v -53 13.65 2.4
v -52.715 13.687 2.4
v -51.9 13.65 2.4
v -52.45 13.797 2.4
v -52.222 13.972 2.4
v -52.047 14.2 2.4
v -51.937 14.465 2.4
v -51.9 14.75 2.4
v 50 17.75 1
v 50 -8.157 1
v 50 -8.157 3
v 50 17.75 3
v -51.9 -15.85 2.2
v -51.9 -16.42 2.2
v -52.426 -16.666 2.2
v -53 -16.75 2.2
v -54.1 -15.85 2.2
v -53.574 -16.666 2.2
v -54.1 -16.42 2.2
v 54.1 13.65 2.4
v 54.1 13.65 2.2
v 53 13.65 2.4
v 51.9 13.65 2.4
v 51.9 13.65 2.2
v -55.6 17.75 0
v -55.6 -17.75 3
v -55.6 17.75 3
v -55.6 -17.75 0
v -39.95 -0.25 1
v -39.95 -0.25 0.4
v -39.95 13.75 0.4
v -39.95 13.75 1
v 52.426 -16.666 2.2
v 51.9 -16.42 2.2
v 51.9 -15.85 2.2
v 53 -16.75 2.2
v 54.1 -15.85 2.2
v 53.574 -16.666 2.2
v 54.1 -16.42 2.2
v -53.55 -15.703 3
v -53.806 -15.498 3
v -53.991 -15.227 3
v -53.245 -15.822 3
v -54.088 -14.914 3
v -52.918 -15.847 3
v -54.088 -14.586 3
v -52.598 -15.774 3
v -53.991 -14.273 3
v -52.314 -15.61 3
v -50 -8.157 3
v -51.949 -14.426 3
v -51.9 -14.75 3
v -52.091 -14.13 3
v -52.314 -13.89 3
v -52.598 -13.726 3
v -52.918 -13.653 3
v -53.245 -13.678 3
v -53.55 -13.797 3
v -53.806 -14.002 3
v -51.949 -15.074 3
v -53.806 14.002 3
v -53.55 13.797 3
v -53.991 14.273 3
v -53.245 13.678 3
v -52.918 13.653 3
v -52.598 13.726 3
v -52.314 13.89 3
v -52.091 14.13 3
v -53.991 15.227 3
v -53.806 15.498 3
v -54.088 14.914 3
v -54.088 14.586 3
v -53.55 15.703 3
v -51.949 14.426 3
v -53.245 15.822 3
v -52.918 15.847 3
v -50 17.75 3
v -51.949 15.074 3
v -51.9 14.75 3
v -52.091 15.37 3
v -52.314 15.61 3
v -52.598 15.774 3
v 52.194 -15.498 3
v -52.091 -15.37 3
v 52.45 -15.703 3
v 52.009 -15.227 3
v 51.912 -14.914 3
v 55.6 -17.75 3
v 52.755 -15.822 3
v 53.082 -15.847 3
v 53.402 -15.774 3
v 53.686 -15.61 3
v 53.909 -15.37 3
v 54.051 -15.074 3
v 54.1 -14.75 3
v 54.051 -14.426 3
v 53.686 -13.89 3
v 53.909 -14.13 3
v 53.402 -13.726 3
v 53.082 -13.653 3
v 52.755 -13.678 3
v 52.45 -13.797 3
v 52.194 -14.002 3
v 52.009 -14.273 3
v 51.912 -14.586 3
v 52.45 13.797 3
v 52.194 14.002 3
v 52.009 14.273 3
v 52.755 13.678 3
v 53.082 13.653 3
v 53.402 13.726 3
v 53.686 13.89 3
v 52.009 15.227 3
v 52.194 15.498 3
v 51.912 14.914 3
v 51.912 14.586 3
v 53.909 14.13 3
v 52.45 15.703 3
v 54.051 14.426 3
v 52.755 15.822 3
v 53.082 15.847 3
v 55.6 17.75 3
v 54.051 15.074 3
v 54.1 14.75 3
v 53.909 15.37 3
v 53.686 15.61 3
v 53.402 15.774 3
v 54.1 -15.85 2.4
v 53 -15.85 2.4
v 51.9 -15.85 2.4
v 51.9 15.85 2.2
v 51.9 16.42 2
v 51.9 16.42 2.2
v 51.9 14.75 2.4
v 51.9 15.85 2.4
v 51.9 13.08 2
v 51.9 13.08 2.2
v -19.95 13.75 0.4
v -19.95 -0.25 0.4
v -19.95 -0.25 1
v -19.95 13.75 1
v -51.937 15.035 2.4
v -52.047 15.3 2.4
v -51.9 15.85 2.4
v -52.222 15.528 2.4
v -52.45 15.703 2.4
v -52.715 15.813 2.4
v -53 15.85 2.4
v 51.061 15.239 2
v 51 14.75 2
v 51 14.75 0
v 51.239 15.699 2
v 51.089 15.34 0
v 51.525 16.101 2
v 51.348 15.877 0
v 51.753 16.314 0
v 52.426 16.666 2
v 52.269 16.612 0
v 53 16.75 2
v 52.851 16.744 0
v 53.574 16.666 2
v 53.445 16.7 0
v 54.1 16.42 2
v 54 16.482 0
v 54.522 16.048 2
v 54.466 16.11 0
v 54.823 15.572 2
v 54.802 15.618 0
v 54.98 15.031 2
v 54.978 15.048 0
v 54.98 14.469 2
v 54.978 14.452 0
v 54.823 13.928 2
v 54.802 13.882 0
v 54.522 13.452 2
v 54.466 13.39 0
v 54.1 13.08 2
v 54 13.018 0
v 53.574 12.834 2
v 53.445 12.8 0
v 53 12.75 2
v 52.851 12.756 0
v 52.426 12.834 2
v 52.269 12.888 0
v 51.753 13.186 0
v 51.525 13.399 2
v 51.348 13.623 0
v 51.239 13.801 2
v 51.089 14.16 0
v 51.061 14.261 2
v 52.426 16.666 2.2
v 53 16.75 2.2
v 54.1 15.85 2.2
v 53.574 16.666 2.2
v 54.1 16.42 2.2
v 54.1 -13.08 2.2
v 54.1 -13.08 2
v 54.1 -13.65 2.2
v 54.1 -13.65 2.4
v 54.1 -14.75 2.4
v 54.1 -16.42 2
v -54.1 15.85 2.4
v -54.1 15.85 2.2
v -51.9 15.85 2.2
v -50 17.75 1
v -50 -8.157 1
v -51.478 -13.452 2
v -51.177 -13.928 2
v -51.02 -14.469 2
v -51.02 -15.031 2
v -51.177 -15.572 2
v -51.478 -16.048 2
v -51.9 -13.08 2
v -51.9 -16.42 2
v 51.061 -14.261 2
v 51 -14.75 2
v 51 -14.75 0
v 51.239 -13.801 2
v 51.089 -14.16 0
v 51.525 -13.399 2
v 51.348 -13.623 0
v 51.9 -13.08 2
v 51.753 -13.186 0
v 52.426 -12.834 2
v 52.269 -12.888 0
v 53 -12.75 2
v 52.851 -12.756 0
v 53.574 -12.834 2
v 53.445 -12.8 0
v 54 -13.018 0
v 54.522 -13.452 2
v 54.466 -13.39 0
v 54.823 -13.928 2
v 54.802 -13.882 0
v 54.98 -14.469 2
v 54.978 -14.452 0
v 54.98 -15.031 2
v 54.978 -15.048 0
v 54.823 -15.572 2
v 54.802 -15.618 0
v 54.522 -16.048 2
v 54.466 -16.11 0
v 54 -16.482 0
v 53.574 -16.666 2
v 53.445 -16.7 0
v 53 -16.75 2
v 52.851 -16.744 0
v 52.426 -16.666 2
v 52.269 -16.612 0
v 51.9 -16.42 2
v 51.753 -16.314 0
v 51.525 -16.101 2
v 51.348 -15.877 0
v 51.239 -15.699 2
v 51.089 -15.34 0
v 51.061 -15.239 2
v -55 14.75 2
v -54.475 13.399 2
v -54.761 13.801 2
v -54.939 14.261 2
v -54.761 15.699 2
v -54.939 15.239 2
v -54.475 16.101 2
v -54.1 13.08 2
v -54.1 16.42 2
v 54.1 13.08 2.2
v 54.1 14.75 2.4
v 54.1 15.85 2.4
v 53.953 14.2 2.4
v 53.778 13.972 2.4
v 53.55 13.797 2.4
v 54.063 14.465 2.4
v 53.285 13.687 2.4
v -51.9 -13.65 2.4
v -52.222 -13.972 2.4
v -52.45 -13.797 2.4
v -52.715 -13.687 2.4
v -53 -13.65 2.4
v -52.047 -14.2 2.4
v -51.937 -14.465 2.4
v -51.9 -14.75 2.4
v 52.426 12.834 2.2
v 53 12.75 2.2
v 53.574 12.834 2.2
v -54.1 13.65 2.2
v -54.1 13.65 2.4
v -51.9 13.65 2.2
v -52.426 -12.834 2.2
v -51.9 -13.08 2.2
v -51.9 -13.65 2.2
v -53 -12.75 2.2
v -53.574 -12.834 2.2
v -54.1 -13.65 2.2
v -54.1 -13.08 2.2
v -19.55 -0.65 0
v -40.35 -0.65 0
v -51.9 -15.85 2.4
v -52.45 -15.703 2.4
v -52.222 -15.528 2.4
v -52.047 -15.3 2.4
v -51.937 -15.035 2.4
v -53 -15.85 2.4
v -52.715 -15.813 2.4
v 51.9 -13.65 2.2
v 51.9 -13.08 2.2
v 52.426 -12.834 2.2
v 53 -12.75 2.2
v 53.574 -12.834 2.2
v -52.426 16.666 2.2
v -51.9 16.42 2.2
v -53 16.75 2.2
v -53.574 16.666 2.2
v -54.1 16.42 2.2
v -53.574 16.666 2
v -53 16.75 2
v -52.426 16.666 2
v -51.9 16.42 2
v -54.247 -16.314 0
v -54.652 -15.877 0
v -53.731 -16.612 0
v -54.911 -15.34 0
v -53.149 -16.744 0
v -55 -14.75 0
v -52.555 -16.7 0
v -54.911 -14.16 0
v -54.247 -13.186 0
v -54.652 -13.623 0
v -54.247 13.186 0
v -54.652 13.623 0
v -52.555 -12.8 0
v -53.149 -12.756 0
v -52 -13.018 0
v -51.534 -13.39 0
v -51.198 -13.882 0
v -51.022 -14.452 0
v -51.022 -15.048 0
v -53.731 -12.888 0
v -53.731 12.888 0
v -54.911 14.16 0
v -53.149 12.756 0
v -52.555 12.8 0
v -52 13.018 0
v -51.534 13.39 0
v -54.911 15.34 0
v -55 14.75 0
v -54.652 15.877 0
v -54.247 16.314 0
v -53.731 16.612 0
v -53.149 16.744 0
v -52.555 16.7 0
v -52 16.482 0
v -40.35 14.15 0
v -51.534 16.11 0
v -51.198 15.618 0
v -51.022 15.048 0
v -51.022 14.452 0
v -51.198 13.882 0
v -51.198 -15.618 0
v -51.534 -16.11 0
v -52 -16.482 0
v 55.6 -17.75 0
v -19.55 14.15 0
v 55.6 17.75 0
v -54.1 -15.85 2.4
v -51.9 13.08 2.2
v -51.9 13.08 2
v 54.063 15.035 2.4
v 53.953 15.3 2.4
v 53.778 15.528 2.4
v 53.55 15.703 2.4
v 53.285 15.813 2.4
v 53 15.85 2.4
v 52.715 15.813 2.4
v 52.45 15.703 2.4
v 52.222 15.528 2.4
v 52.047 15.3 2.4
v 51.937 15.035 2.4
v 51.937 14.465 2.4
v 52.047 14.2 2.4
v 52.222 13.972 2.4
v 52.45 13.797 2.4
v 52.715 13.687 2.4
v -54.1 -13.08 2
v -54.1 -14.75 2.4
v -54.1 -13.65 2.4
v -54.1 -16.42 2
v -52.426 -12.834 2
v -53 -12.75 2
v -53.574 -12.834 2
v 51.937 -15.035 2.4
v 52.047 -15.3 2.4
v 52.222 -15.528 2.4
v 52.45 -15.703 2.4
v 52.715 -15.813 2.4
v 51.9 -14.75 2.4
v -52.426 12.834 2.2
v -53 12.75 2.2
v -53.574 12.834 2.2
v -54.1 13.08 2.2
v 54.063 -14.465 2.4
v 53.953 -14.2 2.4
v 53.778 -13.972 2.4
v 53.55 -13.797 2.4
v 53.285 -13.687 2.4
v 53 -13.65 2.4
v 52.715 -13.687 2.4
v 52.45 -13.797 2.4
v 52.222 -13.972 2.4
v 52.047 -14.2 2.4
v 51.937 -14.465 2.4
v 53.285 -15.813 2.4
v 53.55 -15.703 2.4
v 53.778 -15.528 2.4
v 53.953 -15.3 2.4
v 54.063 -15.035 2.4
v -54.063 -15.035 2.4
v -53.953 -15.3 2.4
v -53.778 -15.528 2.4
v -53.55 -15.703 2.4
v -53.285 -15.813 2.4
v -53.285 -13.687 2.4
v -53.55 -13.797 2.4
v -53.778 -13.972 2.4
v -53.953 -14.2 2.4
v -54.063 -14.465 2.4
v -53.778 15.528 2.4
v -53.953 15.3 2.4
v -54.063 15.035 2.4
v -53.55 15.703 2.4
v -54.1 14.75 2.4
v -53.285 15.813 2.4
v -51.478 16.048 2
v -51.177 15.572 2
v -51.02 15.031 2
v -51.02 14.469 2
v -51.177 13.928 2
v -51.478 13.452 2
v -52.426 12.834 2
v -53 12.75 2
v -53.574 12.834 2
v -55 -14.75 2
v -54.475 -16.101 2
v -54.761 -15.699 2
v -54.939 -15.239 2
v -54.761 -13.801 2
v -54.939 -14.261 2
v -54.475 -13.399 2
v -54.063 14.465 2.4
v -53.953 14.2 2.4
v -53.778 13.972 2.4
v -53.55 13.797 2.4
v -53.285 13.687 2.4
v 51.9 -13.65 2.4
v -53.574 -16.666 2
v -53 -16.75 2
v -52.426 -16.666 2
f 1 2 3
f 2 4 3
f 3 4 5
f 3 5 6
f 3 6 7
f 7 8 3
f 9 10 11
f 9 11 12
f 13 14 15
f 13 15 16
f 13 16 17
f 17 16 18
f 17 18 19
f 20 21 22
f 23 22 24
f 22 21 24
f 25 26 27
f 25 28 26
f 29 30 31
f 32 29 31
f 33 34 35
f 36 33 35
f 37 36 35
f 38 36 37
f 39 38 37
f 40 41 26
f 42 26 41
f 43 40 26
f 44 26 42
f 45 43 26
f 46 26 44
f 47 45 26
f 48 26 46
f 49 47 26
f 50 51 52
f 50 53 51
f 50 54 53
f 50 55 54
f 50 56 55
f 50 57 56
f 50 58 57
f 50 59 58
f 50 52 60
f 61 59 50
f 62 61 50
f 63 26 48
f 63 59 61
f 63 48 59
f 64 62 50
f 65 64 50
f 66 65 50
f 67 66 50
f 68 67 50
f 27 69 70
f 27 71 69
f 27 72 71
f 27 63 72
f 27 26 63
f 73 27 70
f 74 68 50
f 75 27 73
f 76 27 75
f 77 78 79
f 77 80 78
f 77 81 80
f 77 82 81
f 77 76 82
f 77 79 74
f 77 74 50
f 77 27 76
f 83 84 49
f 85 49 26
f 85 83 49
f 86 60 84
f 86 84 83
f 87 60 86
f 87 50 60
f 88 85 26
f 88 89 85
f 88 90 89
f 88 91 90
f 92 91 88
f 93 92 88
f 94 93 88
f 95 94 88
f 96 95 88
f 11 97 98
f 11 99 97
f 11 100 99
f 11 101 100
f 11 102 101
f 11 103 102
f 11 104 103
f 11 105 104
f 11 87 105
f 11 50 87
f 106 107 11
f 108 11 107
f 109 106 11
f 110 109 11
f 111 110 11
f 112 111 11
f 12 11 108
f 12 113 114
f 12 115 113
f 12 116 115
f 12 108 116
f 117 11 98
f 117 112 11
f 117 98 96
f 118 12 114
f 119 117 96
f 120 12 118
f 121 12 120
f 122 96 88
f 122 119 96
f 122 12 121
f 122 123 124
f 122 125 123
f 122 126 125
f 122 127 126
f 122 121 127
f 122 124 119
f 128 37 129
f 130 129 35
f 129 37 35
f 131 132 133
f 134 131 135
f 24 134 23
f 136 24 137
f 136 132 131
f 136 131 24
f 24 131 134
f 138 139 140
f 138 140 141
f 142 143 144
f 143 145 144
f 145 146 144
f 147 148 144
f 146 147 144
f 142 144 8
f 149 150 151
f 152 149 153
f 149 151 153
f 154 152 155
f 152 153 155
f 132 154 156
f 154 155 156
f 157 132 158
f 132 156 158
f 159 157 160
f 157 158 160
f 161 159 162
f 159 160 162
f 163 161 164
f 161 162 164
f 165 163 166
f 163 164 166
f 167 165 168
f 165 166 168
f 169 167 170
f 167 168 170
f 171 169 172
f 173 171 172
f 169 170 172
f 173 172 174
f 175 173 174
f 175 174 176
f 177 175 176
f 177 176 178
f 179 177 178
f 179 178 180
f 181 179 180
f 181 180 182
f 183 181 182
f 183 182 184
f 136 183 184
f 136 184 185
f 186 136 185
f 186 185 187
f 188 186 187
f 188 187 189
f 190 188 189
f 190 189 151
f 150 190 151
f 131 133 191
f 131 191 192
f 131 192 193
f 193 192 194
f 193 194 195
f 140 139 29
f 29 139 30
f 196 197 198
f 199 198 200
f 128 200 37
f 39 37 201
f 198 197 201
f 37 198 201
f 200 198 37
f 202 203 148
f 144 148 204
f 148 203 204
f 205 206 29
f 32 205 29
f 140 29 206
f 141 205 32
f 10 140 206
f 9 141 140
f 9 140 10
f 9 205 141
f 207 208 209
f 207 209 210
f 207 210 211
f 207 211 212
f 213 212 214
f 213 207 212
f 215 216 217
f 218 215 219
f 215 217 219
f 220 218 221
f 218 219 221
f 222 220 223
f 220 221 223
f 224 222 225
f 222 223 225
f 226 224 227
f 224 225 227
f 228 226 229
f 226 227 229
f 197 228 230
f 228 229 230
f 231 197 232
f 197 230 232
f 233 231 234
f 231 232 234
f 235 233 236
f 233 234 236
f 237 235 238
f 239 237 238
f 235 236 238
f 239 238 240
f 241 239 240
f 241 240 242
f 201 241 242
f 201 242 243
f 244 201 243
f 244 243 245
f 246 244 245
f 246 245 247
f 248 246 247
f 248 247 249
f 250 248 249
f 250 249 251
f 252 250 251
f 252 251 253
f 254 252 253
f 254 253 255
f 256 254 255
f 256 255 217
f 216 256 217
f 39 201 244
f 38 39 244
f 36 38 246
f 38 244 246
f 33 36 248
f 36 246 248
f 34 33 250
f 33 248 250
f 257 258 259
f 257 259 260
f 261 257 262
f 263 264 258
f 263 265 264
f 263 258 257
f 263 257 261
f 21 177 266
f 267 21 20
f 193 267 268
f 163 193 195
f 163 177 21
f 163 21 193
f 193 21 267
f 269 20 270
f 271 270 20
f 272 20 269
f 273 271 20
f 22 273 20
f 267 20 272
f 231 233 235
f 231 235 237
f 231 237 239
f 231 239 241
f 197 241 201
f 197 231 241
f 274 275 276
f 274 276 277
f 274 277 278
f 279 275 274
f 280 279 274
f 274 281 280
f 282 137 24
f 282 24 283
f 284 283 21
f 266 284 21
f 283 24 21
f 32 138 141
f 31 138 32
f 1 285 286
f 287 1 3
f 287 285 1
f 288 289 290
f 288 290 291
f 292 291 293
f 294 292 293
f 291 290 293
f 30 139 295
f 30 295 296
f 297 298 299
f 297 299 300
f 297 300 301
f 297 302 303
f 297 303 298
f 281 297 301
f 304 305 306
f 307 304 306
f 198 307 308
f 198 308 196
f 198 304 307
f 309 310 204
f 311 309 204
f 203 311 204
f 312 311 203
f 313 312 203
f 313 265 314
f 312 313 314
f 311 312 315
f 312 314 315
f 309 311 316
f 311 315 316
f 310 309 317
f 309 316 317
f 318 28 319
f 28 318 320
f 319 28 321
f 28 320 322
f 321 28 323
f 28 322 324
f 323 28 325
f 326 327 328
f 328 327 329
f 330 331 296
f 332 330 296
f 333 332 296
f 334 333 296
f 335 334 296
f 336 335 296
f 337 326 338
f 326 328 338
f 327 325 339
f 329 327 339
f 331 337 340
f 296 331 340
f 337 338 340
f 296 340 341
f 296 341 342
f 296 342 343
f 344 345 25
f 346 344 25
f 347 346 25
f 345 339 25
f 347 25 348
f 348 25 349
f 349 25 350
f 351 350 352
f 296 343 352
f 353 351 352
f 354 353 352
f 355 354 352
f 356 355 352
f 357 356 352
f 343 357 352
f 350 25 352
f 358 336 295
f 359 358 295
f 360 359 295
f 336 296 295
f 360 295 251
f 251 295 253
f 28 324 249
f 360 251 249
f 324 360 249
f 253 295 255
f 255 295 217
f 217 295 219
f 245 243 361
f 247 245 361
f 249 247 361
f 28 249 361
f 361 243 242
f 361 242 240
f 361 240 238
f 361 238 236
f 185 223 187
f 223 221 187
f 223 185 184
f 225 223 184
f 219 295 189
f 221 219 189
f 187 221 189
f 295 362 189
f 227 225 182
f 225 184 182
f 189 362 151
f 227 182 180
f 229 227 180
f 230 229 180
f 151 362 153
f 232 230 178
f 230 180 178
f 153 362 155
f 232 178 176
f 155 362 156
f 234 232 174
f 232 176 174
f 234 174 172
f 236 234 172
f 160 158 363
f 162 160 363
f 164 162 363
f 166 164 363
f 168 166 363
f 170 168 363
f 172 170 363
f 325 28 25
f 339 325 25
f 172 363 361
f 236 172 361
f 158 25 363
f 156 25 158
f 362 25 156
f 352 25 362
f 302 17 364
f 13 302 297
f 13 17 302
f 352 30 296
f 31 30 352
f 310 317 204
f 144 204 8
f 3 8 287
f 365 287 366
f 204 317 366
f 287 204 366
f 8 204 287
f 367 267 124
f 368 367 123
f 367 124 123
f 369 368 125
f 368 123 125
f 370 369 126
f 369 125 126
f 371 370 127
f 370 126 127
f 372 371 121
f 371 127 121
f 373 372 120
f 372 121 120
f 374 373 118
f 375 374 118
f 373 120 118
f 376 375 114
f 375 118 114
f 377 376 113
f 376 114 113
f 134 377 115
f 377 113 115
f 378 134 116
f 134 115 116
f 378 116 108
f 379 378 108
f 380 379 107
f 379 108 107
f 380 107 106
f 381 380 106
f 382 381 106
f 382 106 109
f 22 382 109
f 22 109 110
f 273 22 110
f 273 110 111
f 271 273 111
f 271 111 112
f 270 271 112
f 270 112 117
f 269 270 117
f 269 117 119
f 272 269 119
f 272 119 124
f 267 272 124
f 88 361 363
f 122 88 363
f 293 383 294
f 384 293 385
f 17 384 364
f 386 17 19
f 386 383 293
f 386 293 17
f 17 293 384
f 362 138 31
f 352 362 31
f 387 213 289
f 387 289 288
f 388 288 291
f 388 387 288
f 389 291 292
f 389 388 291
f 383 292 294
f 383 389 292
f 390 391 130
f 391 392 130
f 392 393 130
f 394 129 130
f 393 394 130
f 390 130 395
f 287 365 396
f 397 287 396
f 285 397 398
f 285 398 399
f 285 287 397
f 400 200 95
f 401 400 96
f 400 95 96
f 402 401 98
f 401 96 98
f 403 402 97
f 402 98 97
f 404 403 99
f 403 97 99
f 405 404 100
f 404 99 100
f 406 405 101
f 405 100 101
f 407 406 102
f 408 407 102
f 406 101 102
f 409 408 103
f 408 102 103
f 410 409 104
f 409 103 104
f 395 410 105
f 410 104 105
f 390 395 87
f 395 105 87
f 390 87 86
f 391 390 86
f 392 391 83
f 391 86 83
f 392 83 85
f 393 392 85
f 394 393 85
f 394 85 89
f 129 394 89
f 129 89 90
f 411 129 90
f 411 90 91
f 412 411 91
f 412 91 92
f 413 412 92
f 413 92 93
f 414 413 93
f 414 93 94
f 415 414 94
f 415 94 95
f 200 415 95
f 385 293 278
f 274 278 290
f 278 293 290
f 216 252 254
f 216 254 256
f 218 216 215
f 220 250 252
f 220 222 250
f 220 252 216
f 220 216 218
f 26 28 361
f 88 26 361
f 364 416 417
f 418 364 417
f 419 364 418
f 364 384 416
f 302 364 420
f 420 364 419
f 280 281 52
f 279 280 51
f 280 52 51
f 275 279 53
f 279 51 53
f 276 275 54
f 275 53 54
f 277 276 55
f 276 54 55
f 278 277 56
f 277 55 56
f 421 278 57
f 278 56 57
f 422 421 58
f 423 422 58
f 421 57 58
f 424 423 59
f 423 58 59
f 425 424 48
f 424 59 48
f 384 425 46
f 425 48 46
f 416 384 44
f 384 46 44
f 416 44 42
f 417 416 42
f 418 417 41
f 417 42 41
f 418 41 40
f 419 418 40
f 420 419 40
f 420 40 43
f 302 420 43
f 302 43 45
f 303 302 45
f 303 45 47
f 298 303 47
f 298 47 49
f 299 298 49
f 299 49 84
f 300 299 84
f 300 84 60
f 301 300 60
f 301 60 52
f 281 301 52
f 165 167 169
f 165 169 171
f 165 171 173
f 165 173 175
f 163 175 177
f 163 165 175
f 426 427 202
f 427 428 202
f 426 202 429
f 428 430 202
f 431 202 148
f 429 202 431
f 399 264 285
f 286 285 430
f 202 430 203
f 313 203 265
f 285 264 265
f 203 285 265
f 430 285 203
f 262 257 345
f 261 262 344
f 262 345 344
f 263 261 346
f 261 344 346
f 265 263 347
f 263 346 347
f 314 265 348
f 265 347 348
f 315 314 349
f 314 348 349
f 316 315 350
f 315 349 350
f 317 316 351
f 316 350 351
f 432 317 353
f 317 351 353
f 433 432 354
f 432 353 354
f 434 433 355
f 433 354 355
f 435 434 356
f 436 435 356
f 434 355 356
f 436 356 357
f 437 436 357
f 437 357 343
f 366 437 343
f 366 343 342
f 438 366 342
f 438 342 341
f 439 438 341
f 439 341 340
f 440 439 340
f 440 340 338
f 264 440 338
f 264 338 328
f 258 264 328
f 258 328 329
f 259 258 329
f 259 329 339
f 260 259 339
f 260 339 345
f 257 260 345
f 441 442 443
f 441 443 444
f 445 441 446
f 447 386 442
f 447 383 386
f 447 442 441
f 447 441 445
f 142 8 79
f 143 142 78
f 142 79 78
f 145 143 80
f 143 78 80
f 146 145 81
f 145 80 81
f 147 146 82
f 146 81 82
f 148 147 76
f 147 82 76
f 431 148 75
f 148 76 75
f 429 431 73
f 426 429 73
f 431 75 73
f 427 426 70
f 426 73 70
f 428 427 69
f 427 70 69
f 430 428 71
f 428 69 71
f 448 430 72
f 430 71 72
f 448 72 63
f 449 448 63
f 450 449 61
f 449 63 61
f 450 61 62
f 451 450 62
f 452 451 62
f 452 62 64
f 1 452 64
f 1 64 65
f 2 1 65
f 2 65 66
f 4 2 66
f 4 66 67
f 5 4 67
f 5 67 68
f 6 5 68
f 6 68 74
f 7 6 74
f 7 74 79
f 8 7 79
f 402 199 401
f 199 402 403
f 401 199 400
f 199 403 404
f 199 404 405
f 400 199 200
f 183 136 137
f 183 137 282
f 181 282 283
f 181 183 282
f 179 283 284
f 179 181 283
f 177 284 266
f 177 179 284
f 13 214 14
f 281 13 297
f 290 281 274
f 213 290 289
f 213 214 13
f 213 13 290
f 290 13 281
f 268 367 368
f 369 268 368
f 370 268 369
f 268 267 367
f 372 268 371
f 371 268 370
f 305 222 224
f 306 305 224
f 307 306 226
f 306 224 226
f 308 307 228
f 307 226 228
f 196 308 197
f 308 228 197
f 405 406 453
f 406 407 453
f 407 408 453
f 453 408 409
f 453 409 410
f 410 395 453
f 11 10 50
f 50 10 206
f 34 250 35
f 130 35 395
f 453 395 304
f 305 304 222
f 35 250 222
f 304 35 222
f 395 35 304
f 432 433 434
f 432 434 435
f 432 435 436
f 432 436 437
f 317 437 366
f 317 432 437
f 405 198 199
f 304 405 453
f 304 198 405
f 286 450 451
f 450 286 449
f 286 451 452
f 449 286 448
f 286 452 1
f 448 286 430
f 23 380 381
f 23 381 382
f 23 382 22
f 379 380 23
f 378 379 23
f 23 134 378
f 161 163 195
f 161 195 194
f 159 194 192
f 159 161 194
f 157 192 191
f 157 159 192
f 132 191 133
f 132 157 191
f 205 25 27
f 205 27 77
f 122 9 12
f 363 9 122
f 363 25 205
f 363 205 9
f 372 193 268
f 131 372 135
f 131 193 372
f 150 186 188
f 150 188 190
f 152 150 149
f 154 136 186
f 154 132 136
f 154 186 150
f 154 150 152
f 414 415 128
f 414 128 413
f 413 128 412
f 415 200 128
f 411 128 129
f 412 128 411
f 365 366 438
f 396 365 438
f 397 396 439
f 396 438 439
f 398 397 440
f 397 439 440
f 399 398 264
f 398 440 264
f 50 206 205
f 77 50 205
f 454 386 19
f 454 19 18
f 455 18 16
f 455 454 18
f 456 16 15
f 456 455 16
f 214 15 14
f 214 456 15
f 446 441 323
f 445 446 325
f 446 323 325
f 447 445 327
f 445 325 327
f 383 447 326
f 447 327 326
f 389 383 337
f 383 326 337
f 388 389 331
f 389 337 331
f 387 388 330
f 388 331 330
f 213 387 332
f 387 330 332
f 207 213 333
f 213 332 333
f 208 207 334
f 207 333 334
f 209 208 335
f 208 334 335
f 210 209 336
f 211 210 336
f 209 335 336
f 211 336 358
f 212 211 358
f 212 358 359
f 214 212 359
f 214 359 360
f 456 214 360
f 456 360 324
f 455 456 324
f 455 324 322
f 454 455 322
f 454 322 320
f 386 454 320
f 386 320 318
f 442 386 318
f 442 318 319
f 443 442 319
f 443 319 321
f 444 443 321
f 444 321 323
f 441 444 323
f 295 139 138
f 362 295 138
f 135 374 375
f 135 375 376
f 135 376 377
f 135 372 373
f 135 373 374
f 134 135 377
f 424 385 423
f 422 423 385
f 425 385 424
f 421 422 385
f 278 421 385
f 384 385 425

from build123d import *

# Parameters (mm, degrees)
SKETCH1_W                       = 112
SKETCH1_H                       = 35.5
BOSS_EXTRUDE1_DEPTH             = 1
SKETCH2_W                       = 6
SKETCH2_H                       = 6
BOSS_EXTRUDE2_DEPTH             = 2
SKETCH3_R                       = 1.1
CUT_EXTRUDE1_DEPTH              = 4
SKETCH4_R                       = 2
CUT_EXTRUDE2_DEPTH              = 2
SKETCH5_W                       = 20
SKETCH5_H                       = 14
CUT_EXTRUDE3_DEPTH              = 4
CHAMFER1_SIZE                   = 0.4
CUT_EXTRUDE4_DEPTH              = 0.2
SKETCH7_W                       = 2.2
SKETCH7_H                       = 2.2
CUT_EXTRUDE5_DEPTH              = 0.2
MIRROR2_COPY_1_DEPTH            = 0.2
MIRROR2_COPY_2_SKETCH_W         = 2.2
MIRROR2_COPY_2_SKETCH_H         = 2.2
MIRROR2_COPY_2_DEPTH            = 0.2
SKETCH8_W                       = 0.4
SKETCH8_H                       = 35.5
CUT_EXTRUDE6_DEPTH              = 3
CUT_EXTRUDE6_DEPTH_BACK         = 2
SKIZZE1_W                       = 5.6
SKIZZE1_H                       = 23.5
AUFSATZ_LINEAR_AUSTRAGEN1_DEPTH = 2


with BuildPart() as part:
    # Sketch1 → Boss-Extrude1 (new body)
    with BuildSketch(Plane.XY):
        Rectangle(SKETCH1_W, SKETCH1_H)
    extrude(amount=BOSS_EXTRUDE1_DEPTH)

    # Sketch2 → Boss-Extrude2 (add)
    with BuildSketch(Plane.XY.offset(1)):
        with Locations((-53, 14.75)):
            Rectangle(SKETCH2_W, SKETCH2_H)
        with Locations((-53, -14.75)):
            Rectangle(SKETCH2_W, SKETCH2_H)
        with Locations((53, -14.75)):
            Rectangle(SKETCH2_W, SKETCH2_H)
        with Locations((53, 14.75)):
            Rectangle(SKETCH2_W, SKETCH2_H)
    extrude(amount=BOSS_EXTRUDE2_DEPTH)

    # Sketch3 → Cut-Extrude1 (cut, through all)
    with BuildSketch(Plane.XY.offset(3)):
        with Locations((-53, 14.75)):
            Circle(SKETCH3_R)
        with Locations((-53, -14.75)):
            Circle(SKETCH3_R)
        with Locations((53, -14.75)):
            Circle(SKETCH3_R)
        with Locations((53, 14.75)):
            Circle(SKETCH3_R)
    extrude(amount=-CUT_EXTRUDE1_DEPTH, mode=Mode.SUBTRACT)

    # Sketch4 → Cut-Extrude2 (cut)
    with BuildSketch(Plane(origin=(0, 0, 0), x_dir=(-1, 0, 0), z_dir=(0, 0, -1))):
        with Locations((-53, 14.75)):
            Circle(SKETCH4_R)
        with Locations((-53, -14.75)):
            Circle(SKETCH4_R)
        with Locations((53, 14.75)):
            Circle(SKETCH4_R)
        with Locations((53, -14.75)):
            Circle(SKETCH4_R)
    extrude(amount=-CUT_EXTRUDE2_DEPTH, mode=Mode.SUBTRACT)

    # Sketch5 → Cut-Extrude3 (cut, through all)
    with BuildSketch(Plane(origin=(0, 0, 0), x_dir=(-1, 0, 0), z_dir=(0, 0, -1))):
        with Locations((29.95, 6.75)):
            Rectangle(SKETCH5_W, SKETCH5_H)
    extrude(amount=-CUT_EXTRUDE3_DEPTH, mode=Mode.SUBTRACT)

    # Chamfer1
    chamfer1_edges = [part.edges().sort_by_distance(p)[0] for p in [
        (-39.95, 6.75, 0),
        (-29.95, 13.75, 0),
        (-19.95, 6.75, 0),
        (-29.95, -0.25, 0),
    ]]
    chamfer(chamfer1_edges, length=CHAMFER1_SIZE)

    # Sketch6 → Cut-Extrude4 (cut)
    with BuildSketch(Plane(origin=(0, 0, 2), x_dir=(-1, 0, 0), z_dir=(0, 0, -1))):
        with BuildLine():
            Line((-54.1, 13.079670691), (-54.1, 16.420329309))
            ThreePointArc((-54.1, 16.420329309), (-53, 16.75), (-51.9, 16.420329309))
            Line((-51.9, 16.420329309), (-51.9, 13.079670691))
            ThreePointArc((-51.9, 13.079670691), (-53, 12.75), (-54.1, 13.079670691))
        make_face()
    cut_extrude4 = extrude(amount=-CUT_EXTRUDE4_DEPTH, mode=Mode.SUBTRACT)

    # Sketch7 → Cut-Extrude5 (cut)
    with BuildSketch(Plane(origin=(0, 0, 2.2), x_dir=(-1, 0, 0), z_dir=(0, 0, -1))):
        with Locations((-53, 14.75)):
            Rectangle(SKETCH7_W, SKETCH7_H)
    cut_extrude5 = extrude(amount=-CUT_EXTRUDE5_DEPTH, mode=Mode.SUBTRACT)

    # Mirror1: Cut-Extrude4, Cut-Extrude5 across plane
    add(cut_extrude4.mirror(Plane(origin=(0, 0, 0), x_dir=(0, 0, 1), z_dir=(1, 0, 0))), mode=Mode.SUBTRACT)
    add(cut_extrude5.mirror(Plane(origin=(0, 0, 0), x_dir=(0, 0, 1), z_dir=(1, 0, 0))), mode=Mode.SUBTRACT)

    # Mirror2: Cut-Extrude4, Cut-Extrude5 across plane
    add(cut_extrude4.mirror(Plane.ZX), mode=Mode.SUBTRACT)
    add(cut_extrude5.mirror(Plane.ZX), mode=Mode.SUBTRACT)

    # Mirror2 copy 1 sketch → Mirror2 copy 1 (cut)
    with BuildSketch(Plane(origin=(0, 0, 2), x_dir=(1, 0, 0), z_dir=(0, 0, -1))):
        with BuildLine():
            Line((-54.1, 13.079670691), (-54.1, 16.420329309))
            ThreePointArc((-54.1, 16.420329309), (-53, 16.75), (-51.9, 16.420329309))
            Line((-51.9, 16.420329309), (-51.9, 13.079670691))
            ThreePointArc((-51.9, 13.079670691), (-53, 12.75), (-54.1, 13.079670691))
        make_face()
    extrude(amount=-MIRROR2_COPY_1_DEPTH, mode=Mode.SUBTRACT)

    # Mirror2 copy 2 sketch → Mirror2 copy 2 (cut)
    with BuildSketch(Plane(origin=(0, 0, 2.2), x_dir=(1, 0, 0), z_dir=(0, 0, -1))):
        with Locations((-53, 14.75)):
            Rectangle(MIRROR2_COPY_2_SKETCH_W, MIRROR2_COPY_2_SKETCH_H)
    extrude(amount=-MIRROR2_COPY_2_DEPTH, mode=Mode.SUBTRACT)

    # Sketch8 → Cut-Extrude6 (cut, two sides)
    with BuildSketch(Plane.XY.offset(1)) as cut_extrude6_sk:
        with Locations((-55.8, 0)):
            Rectangle(SKETCH8_W, SKETCH8_H)
        with Locations((55.8, 0)):
            Rectangle(SKETCH8_W, SKETCH8_H)
    extrude(amount=CUT_EXTRUDE6_DEPTH, mode=Mode.SUBTRACT)
    extrude(cut_extrude6_sk.sketch, amount=-CUT_EXTRUDE6_DEPTH_BACK, mode=Mode.SUBTRACT)

    # Skizze1 → Aufsatz-Linear austragen1 (add)
    with BuildSketch(Plane.XY.offset(1)):
        Polygon((50, -8.156810447), (-50, -8.156810447), (-50, -11.75), (-50, -17.75), (50, -17.75), (50, -11.75), align=None)
        with Locations((-52.8, 0)):
            Rectangle(SKIZZE1_W, SKIZZE1_H)
        with Locations((52.8, 0)):
            Rectangle(SKIZZE1_W, SKIZZE1_H)
    extrude(amount=AUFSATZ_LINEAR_AUSTRAGEN1_DEPTH)


solid = part.part
